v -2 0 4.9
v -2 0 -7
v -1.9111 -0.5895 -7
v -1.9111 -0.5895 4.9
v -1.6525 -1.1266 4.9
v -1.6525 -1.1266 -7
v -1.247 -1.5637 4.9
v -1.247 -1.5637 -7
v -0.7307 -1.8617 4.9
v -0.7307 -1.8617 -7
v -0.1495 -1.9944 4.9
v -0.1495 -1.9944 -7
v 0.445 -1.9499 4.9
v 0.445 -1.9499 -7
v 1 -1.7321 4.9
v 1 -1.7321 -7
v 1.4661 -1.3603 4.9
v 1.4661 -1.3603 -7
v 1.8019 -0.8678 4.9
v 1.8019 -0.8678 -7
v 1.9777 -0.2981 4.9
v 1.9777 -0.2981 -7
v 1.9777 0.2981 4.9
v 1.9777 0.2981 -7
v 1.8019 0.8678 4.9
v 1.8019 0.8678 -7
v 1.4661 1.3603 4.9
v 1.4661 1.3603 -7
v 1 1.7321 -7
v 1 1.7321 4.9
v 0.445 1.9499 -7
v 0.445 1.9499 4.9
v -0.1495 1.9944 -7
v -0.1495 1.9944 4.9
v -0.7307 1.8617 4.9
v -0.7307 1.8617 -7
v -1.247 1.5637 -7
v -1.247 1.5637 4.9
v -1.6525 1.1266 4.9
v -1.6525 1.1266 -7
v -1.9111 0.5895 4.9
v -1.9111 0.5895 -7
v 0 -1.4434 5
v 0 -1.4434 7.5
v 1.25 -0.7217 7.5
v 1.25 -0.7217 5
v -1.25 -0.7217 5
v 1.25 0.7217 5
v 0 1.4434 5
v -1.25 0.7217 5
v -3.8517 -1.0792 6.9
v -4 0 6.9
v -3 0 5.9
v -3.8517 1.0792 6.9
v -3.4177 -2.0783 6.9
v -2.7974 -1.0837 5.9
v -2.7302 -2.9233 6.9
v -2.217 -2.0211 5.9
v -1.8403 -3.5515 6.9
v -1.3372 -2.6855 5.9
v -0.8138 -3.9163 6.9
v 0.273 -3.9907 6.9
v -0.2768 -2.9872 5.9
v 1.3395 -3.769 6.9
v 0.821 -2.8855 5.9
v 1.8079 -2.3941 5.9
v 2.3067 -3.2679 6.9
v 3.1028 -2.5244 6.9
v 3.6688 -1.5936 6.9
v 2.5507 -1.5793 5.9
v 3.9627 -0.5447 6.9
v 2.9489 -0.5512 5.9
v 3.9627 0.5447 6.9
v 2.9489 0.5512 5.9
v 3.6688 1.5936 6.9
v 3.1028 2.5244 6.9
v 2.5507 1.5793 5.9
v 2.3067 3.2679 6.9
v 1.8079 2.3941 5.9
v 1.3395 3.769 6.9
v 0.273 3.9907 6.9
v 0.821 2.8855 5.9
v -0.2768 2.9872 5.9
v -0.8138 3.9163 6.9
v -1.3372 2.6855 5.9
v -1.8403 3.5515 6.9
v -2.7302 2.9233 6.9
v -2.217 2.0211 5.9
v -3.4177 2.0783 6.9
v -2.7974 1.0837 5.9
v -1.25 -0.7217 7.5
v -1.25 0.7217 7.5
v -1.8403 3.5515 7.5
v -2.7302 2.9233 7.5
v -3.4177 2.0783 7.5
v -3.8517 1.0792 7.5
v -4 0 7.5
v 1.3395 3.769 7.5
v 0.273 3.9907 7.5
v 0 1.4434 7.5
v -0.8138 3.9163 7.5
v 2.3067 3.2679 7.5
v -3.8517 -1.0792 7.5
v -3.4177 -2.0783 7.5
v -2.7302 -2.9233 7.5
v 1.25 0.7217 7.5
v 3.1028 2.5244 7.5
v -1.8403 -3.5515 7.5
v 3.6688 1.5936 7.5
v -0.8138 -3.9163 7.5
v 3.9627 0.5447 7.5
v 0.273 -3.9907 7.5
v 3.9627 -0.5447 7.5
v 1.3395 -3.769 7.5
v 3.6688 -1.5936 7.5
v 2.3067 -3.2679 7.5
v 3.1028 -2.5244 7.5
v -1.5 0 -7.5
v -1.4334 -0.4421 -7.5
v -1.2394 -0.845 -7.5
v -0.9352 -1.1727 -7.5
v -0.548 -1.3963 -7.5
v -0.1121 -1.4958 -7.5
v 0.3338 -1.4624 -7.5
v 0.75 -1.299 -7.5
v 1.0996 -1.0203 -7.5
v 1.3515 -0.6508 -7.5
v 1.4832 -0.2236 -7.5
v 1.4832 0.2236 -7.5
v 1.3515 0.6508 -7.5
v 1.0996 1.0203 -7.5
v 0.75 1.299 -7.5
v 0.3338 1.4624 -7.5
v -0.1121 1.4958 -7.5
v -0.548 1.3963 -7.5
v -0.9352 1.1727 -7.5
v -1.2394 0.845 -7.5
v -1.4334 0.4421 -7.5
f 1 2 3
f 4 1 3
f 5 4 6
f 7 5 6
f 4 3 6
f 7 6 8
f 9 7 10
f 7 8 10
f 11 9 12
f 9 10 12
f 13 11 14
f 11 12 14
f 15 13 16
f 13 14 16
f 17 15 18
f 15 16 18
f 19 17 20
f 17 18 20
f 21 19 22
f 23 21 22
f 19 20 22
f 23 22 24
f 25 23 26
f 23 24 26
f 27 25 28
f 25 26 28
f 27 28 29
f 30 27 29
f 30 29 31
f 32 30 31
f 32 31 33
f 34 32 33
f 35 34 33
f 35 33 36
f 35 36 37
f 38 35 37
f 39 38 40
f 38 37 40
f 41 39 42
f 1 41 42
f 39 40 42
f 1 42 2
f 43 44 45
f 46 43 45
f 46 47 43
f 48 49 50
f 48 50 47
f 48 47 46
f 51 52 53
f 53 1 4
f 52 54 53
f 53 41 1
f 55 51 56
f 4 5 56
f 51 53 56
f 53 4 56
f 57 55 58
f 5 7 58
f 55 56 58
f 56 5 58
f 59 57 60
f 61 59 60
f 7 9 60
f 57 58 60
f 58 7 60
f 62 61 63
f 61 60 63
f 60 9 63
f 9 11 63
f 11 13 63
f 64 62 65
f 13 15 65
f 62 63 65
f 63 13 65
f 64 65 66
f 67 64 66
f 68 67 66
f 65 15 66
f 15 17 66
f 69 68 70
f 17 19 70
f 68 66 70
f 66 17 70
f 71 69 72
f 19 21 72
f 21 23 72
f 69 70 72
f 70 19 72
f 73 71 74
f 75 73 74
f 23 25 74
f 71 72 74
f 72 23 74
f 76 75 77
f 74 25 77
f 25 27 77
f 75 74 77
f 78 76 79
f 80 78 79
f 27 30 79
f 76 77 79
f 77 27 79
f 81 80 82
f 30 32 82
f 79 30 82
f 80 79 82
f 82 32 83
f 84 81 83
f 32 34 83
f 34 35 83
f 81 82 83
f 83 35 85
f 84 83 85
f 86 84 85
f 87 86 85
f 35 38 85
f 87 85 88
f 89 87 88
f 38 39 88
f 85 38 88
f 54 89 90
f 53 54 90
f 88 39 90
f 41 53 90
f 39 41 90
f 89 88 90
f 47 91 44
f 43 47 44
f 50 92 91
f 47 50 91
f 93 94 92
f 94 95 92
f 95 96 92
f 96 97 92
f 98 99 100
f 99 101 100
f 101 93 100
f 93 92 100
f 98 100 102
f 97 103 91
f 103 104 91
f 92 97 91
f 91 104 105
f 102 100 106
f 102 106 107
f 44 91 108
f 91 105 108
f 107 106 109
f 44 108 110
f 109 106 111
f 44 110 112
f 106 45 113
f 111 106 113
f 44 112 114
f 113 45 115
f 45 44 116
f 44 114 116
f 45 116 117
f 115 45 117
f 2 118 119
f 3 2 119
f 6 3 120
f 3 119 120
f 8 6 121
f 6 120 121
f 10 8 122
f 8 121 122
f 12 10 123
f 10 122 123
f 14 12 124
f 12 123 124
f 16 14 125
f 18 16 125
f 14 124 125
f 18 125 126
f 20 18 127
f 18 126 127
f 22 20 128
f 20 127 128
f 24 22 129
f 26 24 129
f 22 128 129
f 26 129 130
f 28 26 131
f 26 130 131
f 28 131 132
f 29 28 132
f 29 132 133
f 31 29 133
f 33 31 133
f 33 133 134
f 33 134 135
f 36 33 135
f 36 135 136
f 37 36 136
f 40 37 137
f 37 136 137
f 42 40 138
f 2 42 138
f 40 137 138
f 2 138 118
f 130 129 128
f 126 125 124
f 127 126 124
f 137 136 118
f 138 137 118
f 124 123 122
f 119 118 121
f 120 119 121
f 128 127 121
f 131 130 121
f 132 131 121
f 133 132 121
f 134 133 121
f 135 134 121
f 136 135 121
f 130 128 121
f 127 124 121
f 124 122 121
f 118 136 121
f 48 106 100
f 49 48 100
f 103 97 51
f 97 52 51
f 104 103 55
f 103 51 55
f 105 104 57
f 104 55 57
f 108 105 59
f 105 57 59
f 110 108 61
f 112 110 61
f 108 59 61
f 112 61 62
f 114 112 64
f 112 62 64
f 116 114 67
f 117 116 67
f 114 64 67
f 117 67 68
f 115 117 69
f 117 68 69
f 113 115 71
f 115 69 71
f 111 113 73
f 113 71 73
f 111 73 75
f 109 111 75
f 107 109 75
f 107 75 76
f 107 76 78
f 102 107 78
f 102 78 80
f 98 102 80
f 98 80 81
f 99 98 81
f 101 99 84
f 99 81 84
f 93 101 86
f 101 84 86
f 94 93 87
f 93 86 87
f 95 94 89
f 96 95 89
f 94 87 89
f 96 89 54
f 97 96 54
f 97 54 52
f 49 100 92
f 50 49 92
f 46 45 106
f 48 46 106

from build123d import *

# Parameters (mm, degrees)
CHAMFER_1_SIZE      = 0.5
CUT_EXTRUDE_1_DEPTH = 2.5


with BuildPart() as part:
    # 草图1 → 旋转1 (revolve)
    with BuildSketch(Plane(origin=(0, 0, 0), x_dir=(0, 0, -1), z_dir=(1, 0, 0)), mode=Mode.PRIVATE) as revolve_1_sk:
        Polygon((-7.5, 0), (-7.5, 4), (-6.9, 4), (-4.9, 2), (7.5, 2), (7.5, 0), align=None)
    revolve(revolve_1_sk.sketch.rotate(Axis((0, 0, -7.5), (0, 0, 1)), 90), axis=Axis((0, 0, -7.5), (0, 0, 1)))

    # 倒角1
    chamfer_1_edges = [part.edges().sort_by_distance(p)[0] for p in [
        (2, 0, -7.5),
    ]]
    chamfer(chamfer_1_edges, length=CHAMFER_1_SIZE)

    # 草图2 → 切除-拉伸1 (cut)
    with BuildSketch(Plane.XY.offset(7.5)):
        Polygon((0, 1.443375673), (-1.25, 0.721687836), (-1.25, -0.721687836), (0, -1.443375673), (1.25, -0.721687836), (1.25, 0.721687836), align=None)
    extrude(amount=-CUT_EXTRUDE_1_DEPTH, mode=Mode.SUBTRACT)


solid = part.part
